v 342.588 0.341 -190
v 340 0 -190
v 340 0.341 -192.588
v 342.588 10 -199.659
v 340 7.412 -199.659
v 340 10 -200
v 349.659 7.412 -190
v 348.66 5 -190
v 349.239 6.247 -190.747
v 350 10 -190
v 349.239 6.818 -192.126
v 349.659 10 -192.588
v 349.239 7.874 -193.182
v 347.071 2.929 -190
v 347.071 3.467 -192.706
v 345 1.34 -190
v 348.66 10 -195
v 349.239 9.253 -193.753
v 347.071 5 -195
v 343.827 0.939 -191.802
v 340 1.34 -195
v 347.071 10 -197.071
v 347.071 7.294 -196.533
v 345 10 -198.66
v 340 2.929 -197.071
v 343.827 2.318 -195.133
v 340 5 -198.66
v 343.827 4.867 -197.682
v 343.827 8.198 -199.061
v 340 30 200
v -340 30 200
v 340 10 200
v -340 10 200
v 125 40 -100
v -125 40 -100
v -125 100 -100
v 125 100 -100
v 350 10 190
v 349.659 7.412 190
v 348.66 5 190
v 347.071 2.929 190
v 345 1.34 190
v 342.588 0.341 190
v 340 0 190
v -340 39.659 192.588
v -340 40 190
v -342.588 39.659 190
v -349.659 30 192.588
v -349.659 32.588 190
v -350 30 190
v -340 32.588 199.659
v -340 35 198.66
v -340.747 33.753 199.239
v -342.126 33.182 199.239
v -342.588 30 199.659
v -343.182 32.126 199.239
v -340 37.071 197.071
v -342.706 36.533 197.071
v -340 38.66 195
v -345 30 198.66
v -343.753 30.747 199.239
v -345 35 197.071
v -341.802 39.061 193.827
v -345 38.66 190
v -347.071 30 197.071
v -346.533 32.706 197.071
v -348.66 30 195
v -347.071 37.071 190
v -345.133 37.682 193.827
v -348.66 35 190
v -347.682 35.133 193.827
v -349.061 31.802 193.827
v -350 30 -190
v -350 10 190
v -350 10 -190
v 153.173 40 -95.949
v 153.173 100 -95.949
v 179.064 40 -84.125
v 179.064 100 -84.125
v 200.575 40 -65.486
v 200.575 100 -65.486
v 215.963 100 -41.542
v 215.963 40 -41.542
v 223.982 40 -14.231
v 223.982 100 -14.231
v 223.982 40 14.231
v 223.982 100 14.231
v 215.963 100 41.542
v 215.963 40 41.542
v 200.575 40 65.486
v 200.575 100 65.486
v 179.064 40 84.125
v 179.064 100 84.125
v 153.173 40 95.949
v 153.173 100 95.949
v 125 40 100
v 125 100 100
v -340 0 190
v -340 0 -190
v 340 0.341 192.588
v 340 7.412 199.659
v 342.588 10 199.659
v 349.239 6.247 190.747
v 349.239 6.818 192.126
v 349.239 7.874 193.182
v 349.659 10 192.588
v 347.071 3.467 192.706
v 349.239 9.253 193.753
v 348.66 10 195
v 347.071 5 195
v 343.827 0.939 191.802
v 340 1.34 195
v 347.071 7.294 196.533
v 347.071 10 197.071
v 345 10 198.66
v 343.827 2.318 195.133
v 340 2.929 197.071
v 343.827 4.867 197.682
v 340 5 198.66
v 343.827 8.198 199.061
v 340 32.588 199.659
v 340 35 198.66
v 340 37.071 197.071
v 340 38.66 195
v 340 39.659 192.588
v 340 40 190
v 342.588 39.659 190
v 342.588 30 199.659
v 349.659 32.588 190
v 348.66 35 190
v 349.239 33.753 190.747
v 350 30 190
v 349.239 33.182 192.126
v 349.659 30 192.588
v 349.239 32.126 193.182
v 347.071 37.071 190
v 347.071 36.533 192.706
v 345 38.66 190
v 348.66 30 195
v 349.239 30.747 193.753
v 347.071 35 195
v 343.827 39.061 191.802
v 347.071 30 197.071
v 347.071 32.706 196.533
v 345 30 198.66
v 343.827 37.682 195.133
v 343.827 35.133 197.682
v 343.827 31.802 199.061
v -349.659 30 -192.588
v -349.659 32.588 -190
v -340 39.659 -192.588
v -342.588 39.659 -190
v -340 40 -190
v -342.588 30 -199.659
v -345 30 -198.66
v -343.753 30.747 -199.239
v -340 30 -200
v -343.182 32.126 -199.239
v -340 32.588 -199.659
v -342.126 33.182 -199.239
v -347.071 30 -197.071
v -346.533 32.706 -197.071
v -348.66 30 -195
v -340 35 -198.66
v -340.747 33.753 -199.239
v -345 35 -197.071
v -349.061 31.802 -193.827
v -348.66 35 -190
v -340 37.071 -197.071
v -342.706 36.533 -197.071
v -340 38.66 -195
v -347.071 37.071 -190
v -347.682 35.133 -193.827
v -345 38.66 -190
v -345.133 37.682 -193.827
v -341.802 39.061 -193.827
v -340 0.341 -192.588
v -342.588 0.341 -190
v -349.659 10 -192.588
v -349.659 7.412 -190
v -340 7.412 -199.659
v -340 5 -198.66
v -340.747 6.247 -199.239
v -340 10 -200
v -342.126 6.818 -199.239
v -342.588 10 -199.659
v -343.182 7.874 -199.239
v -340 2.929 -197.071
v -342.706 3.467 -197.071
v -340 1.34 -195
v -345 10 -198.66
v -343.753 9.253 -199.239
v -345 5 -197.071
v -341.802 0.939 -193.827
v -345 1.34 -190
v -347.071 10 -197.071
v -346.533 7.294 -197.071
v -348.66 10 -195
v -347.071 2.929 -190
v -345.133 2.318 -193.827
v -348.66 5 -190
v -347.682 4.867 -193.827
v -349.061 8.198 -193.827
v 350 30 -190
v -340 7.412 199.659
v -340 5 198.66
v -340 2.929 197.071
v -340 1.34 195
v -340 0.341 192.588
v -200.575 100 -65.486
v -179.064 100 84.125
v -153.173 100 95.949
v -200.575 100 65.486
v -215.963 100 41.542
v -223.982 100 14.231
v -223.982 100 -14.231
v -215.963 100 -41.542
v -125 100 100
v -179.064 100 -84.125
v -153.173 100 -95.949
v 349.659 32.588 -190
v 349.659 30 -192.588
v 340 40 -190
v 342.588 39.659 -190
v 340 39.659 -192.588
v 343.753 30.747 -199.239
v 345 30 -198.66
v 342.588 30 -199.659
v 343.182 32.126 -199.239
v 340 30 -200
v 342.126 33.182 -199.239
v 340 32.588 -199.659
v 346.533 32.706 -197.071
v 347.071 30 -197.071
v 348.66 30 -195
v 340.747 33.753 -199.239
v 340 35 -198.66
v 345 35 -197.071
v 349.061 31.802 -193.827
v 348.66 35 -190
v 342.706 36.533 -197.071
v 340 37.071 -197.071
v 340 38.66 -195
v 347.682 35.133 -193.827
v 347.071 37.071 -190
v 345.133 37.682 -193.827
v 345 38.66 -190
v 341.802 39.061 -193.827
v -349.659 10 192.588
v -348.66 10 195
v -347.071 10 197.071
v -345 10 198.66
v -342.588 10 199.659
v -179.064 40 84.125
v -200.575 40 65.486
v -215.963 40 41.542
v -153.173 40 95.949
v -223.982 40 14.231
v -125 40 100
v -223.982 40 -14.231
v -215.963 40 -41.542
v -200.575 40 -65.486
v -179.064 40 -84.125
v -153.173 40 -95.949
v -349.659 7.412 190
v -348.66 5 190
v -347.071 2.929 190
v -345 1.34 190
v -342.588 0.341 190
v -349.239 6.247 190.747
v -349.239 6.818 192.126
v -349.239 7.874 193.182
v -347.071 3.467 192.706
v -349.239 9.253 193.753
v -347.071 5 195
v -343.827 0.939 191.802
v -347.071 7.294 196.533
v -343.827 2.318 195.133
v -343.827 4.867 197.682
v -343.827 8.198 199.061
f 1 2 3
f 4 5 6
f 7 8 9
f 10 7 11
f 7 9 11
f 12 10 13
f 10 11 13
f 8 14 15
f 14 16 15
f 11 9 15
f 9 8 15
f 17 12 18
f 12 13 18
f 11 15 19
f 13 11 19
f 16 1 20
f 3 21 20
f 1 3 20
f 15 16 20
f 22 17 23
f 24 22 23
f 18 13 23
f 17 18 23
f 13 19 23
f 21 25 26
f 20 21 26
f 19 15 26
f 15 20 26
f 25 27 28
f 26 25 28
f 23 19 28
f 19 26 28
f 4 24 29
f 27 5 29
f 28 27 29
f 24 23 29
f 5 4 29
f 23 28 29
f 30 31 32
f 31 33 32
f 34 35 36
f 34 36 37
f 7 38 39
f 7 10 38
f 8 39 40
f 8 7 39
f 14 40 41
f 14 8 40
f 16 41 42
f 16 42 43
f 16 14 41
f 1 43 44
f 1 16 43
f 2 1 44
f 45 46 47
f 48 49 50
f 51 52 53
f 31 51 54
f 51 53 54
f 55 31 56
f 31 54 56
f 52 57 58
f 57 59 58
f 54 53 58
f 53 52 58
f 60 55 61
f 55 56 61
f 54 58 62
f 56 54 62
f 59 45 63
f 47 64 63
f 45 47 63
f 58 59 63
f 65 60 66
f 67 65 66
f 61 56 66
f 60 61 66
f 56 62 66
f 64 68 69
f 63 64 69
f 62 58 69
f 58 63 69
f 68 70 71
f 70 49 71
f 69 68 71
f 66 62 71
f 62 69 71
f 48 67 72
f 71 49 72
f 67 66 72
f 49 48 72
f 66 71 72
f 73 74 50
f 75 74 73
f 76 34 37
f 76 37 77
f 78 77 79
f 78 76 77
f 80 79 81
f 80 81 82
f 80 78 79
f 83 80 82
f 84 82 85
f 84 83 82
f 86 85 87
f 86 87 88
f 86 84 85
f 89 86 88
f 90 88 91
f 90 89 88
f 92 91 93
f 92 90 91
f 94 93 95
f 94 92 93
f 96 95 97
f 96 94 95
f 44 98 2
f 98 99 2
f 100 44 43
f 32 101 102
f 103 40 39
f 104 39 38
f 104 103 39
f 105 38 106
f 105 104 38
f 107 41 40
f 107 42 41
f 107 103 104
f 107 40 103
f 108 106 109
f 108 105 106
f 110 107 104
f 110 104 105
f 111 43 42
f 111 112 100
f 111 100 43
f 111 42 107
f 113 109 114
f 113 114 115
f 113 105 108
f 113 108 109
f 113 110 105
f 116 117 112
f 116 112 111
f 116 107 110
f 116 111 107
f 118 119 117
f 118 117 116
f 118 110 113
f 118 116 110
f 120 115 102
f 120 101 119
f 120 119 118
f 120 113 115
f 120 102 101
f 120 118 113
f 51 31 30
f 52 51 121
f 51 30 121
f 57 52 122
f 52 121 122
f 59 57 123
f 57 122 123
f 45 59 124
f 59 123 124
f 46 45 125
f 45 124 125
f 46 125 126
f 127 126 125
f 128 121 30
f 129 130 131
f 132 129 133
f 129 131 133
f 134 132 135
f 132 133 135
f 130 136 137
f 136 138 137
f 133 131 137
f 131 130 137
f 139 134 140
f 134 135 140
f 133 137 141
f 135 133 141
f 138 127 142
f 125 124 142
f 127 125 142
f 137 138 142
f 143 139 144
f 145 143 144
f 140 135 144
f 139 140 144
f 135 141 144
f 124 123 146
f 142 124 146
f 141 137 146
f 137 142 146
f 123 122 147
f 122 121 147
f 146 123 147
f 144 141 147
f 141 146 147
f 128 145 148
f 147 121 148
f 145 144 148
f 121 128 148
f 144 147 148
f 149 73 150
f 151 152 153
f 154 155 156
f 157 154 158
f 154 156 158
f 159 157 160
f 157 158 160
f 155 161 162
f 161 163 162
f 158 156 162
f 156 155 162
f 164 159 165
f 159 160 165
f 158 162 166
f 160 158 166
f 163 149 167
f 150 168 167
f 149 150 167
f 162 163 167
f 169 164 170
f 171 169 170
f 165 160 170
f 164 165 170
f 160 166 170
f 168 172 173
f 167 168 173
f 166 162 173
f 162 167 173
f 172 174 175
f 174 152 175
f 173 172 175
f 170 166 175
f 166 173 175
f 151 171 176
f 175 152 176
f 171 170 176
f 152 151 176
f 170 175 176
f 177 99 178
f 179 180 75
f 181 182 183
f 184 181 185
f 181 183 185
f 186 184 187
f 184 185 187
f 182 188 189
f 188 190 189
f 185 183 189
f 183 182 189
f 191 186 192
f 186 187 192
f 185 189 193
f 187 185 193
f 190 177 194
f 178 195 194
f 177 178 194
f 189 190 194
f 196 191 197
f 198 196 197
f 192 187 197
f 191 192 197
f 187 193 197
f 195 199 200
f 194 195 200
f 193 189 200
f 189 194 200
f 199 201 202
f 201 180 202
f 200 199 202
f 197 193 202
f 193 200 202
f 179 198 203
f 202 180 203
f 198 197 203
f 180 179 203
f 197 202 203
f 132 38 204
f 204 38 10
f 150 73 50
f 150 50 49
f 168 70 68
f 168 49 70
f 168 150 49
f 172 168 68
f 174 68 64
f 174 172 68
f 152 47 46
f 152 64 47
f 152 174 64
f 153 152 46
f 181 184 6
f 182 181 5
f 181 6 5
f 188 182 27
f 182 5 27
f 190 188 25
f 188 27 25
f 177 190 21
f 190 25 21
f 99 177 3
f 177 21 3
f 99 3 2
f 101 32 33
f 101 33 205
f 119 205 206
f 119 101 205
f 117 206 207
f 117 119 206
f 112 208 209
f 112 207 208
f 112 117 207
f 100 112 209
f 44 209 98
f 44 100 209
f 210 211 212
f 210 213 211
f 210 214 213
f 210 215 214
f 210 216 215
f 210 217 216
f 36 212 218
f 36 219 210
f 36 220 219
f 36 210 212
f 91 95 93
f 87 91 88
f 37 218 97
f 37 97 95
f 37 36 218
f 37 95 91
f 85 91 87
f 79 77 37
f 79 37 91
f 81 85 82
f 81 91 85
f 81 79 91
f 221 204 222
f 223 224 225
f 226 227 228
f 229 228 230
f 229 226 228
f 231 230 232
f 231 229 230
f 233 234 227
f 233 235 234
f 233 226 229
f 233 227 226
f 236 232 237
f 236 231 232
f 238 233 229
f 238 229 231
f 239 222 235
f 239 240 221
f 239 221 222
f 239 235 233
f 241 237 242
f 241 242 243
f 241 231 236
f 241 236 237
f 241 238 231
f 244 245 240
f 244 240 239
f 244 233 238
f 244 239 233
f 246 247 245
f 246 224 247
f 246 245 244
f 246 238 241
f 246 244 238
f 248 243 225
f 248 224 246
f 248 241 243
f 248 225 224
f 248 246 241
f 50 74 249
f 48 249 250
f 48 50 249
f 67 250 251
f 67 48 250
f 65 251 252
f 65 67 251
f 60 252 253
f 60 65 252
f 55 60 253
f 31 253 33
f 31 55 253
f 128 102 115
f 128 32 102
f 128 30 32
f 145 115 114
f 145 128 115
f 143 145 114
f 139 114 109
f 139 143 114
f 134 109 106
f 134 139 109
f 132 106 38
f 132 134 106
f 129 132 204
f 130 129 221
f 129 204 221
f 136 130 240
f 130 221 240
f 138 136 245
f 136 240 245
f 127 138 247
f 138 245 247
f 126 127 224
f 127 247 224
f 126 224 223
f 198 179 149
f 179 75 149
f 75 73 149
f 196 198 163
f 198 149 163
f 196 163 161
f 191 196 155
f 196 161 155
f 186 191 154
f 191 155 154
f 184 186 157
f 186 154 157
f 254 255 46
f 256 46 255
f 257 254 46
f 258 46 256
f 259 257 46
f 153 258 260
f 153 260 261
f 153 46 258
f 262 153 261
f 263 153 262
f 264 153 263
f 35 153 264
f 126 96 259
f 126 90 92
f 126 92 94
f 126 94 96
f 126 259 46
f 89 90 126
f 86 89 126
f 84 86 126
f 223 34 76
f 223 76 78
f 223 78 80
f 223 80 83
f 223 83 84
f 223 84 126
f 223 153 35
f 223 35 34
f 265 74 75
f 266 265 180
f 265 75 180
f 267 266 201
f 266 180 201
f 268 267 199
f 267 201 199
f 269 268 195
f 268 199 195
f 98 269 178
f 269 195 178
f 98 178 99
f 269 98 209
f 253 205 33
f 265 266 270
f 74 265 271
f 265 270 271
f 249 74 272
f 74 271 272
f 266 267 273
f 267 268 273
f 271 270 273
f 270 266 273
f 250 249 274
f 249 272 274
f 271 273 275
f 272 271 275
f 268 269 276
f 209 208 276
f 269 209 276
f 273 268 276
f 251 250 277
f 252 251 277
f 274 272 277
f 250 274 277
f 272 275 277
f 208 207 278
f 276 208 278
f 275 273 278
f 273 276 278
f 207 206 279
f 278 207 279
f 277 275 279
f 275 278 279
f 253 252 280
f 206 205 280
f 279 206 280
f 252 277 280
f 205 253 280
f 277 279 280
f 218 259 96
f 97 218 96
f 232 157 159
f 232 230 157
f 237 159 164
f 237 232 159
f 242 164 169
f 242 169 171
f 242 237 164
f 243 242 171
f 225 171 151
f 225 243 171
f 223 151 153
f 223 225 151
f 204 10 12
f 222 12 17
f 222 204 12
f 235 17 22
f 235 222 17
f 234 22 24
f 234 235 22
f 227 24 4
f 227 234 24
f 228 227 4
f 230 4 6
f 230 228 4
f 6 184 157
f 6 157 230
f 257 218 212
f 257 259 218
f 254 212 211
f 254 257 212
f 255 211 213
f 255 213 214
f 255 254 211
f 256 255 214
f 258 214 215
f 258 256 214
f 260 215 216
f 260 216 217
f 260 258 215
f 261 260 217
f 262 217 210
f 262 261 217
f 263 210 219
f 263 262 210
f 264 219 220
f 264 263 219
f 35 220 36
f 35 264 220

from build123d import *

# Parameters (mm, degrees)
SKETCH1_W           = 700
SKETCH1_H           = 400
BOSS_EXTRUDE1_DEPTH = 40
FILLET1_R           = 10
SKETCH2_W           = 450
SKETCH2_H           = 200
BOSS_EXTRUDE2_DEPTH = 60
FILLET2_RADIUS      = 100
FILLET2_LENGTH      = 60
FILLET3_RADIUS      = 100
FILLET3_LENGTH      = 60


with BuildPart() as part:
    # Sketch1 → Boss-Extrude1 (new body)
    with BuildSketch(Plane(origin=(0, 0, 0), x_dir=(1, 0, 0), z_dir=(0, 1, 0))):
        Rectangle(SKETCH1_W, SKETCH1_H)
    extrude(amount=BOSS_EXTRUDE1_DEPTH)

    # Fillet1
    fillet1_edges = [part.edges().sort_by_distance(p)[0] for p in [
        (-350, 40, 0),
        (0, 40, 200),
        (350, 40, 0),
        (0, 0, 200),
        (-350, 0, 0),
        (0, 0, -200),
        (350, 0, 0),
        (350, 20, 200),
        (-350, 20, 200),
        (-350, 20, -200),
        (350, 20, -200),
        (0, 40, -200),
    ]]
    fillet(fillet1_edges, radius=FILLET1_R)

    # Sketch2 → Boss-Extrude2 (add)
    with BuildSketch(Plane(origin=(0, 40, 0), x_dir=(1, 0, 0), z_dir=(0, 1, 0))):
        Rectangle(SKETCH2_W, SKETCH2_H)
    extrude(amount=BOSS_EXTRUDE2_DEPTH)

    # Fillet2: full round fillet: the end face becomes a half cylinder, R = half its width
    fillet2_face = Plane((225, 70, 0), x_dir=(0, -1, 0), z_dir=(1, 0, 0))  # on the end face: x along it, z out of the body
    fillet2_slab = fillet2_face.offset(-FILLET2_RADIUS / 2) * Box(FILLET2_LENGTH, 2 * FILLET2_RADIUS, FILLET2_RADIUS, mode=Mode.PRIVATE)  # the body's end, R deep
    fillet2_round = Plane((125, 70, 0), x_dir=(1, 0, 0), z_dir=(0, -1, 0)) * Cylinder(FILLET2_RADIUS, FILLET2_LENGTH, mode=Mode.PRIVATE)  # its axis R under the face
    add(fillet2_slab - fillet2_round, mode=Mode.SUBTRACT)

    # Fillet3: full round fillet: the end face becomes a half cylinder, R = half its width
    fillet3_face = Plane((-225, 70, 0), x_dir=(0, -1, 0), z_dir=(-1, 0, 0))  # on the end face: x along it, z out of the body
    fillet3_slab = fillet3_face.offset(-FILLET3_RADIUS / 2) * Box(FILLET3_LENGTH, 2 * FILLET3_RADIUS, FILLET3_RADIUS, mode=Mode.PRIVATE)  # the body's end, R deep
    fillet3_round = Plane((-125, 70, 0), x_dir=(-1, 0, 0), z_dir=(0, -1, 0)) * Cylinder(FILLET3_RADIUS, FILLET3_LENGTH, mode=Mode.PRIVATE)  # its axis R under the face
    add(fillet3_slab - fillet3_round, mode=Mode.SUBTRACT)


solid = part.part
